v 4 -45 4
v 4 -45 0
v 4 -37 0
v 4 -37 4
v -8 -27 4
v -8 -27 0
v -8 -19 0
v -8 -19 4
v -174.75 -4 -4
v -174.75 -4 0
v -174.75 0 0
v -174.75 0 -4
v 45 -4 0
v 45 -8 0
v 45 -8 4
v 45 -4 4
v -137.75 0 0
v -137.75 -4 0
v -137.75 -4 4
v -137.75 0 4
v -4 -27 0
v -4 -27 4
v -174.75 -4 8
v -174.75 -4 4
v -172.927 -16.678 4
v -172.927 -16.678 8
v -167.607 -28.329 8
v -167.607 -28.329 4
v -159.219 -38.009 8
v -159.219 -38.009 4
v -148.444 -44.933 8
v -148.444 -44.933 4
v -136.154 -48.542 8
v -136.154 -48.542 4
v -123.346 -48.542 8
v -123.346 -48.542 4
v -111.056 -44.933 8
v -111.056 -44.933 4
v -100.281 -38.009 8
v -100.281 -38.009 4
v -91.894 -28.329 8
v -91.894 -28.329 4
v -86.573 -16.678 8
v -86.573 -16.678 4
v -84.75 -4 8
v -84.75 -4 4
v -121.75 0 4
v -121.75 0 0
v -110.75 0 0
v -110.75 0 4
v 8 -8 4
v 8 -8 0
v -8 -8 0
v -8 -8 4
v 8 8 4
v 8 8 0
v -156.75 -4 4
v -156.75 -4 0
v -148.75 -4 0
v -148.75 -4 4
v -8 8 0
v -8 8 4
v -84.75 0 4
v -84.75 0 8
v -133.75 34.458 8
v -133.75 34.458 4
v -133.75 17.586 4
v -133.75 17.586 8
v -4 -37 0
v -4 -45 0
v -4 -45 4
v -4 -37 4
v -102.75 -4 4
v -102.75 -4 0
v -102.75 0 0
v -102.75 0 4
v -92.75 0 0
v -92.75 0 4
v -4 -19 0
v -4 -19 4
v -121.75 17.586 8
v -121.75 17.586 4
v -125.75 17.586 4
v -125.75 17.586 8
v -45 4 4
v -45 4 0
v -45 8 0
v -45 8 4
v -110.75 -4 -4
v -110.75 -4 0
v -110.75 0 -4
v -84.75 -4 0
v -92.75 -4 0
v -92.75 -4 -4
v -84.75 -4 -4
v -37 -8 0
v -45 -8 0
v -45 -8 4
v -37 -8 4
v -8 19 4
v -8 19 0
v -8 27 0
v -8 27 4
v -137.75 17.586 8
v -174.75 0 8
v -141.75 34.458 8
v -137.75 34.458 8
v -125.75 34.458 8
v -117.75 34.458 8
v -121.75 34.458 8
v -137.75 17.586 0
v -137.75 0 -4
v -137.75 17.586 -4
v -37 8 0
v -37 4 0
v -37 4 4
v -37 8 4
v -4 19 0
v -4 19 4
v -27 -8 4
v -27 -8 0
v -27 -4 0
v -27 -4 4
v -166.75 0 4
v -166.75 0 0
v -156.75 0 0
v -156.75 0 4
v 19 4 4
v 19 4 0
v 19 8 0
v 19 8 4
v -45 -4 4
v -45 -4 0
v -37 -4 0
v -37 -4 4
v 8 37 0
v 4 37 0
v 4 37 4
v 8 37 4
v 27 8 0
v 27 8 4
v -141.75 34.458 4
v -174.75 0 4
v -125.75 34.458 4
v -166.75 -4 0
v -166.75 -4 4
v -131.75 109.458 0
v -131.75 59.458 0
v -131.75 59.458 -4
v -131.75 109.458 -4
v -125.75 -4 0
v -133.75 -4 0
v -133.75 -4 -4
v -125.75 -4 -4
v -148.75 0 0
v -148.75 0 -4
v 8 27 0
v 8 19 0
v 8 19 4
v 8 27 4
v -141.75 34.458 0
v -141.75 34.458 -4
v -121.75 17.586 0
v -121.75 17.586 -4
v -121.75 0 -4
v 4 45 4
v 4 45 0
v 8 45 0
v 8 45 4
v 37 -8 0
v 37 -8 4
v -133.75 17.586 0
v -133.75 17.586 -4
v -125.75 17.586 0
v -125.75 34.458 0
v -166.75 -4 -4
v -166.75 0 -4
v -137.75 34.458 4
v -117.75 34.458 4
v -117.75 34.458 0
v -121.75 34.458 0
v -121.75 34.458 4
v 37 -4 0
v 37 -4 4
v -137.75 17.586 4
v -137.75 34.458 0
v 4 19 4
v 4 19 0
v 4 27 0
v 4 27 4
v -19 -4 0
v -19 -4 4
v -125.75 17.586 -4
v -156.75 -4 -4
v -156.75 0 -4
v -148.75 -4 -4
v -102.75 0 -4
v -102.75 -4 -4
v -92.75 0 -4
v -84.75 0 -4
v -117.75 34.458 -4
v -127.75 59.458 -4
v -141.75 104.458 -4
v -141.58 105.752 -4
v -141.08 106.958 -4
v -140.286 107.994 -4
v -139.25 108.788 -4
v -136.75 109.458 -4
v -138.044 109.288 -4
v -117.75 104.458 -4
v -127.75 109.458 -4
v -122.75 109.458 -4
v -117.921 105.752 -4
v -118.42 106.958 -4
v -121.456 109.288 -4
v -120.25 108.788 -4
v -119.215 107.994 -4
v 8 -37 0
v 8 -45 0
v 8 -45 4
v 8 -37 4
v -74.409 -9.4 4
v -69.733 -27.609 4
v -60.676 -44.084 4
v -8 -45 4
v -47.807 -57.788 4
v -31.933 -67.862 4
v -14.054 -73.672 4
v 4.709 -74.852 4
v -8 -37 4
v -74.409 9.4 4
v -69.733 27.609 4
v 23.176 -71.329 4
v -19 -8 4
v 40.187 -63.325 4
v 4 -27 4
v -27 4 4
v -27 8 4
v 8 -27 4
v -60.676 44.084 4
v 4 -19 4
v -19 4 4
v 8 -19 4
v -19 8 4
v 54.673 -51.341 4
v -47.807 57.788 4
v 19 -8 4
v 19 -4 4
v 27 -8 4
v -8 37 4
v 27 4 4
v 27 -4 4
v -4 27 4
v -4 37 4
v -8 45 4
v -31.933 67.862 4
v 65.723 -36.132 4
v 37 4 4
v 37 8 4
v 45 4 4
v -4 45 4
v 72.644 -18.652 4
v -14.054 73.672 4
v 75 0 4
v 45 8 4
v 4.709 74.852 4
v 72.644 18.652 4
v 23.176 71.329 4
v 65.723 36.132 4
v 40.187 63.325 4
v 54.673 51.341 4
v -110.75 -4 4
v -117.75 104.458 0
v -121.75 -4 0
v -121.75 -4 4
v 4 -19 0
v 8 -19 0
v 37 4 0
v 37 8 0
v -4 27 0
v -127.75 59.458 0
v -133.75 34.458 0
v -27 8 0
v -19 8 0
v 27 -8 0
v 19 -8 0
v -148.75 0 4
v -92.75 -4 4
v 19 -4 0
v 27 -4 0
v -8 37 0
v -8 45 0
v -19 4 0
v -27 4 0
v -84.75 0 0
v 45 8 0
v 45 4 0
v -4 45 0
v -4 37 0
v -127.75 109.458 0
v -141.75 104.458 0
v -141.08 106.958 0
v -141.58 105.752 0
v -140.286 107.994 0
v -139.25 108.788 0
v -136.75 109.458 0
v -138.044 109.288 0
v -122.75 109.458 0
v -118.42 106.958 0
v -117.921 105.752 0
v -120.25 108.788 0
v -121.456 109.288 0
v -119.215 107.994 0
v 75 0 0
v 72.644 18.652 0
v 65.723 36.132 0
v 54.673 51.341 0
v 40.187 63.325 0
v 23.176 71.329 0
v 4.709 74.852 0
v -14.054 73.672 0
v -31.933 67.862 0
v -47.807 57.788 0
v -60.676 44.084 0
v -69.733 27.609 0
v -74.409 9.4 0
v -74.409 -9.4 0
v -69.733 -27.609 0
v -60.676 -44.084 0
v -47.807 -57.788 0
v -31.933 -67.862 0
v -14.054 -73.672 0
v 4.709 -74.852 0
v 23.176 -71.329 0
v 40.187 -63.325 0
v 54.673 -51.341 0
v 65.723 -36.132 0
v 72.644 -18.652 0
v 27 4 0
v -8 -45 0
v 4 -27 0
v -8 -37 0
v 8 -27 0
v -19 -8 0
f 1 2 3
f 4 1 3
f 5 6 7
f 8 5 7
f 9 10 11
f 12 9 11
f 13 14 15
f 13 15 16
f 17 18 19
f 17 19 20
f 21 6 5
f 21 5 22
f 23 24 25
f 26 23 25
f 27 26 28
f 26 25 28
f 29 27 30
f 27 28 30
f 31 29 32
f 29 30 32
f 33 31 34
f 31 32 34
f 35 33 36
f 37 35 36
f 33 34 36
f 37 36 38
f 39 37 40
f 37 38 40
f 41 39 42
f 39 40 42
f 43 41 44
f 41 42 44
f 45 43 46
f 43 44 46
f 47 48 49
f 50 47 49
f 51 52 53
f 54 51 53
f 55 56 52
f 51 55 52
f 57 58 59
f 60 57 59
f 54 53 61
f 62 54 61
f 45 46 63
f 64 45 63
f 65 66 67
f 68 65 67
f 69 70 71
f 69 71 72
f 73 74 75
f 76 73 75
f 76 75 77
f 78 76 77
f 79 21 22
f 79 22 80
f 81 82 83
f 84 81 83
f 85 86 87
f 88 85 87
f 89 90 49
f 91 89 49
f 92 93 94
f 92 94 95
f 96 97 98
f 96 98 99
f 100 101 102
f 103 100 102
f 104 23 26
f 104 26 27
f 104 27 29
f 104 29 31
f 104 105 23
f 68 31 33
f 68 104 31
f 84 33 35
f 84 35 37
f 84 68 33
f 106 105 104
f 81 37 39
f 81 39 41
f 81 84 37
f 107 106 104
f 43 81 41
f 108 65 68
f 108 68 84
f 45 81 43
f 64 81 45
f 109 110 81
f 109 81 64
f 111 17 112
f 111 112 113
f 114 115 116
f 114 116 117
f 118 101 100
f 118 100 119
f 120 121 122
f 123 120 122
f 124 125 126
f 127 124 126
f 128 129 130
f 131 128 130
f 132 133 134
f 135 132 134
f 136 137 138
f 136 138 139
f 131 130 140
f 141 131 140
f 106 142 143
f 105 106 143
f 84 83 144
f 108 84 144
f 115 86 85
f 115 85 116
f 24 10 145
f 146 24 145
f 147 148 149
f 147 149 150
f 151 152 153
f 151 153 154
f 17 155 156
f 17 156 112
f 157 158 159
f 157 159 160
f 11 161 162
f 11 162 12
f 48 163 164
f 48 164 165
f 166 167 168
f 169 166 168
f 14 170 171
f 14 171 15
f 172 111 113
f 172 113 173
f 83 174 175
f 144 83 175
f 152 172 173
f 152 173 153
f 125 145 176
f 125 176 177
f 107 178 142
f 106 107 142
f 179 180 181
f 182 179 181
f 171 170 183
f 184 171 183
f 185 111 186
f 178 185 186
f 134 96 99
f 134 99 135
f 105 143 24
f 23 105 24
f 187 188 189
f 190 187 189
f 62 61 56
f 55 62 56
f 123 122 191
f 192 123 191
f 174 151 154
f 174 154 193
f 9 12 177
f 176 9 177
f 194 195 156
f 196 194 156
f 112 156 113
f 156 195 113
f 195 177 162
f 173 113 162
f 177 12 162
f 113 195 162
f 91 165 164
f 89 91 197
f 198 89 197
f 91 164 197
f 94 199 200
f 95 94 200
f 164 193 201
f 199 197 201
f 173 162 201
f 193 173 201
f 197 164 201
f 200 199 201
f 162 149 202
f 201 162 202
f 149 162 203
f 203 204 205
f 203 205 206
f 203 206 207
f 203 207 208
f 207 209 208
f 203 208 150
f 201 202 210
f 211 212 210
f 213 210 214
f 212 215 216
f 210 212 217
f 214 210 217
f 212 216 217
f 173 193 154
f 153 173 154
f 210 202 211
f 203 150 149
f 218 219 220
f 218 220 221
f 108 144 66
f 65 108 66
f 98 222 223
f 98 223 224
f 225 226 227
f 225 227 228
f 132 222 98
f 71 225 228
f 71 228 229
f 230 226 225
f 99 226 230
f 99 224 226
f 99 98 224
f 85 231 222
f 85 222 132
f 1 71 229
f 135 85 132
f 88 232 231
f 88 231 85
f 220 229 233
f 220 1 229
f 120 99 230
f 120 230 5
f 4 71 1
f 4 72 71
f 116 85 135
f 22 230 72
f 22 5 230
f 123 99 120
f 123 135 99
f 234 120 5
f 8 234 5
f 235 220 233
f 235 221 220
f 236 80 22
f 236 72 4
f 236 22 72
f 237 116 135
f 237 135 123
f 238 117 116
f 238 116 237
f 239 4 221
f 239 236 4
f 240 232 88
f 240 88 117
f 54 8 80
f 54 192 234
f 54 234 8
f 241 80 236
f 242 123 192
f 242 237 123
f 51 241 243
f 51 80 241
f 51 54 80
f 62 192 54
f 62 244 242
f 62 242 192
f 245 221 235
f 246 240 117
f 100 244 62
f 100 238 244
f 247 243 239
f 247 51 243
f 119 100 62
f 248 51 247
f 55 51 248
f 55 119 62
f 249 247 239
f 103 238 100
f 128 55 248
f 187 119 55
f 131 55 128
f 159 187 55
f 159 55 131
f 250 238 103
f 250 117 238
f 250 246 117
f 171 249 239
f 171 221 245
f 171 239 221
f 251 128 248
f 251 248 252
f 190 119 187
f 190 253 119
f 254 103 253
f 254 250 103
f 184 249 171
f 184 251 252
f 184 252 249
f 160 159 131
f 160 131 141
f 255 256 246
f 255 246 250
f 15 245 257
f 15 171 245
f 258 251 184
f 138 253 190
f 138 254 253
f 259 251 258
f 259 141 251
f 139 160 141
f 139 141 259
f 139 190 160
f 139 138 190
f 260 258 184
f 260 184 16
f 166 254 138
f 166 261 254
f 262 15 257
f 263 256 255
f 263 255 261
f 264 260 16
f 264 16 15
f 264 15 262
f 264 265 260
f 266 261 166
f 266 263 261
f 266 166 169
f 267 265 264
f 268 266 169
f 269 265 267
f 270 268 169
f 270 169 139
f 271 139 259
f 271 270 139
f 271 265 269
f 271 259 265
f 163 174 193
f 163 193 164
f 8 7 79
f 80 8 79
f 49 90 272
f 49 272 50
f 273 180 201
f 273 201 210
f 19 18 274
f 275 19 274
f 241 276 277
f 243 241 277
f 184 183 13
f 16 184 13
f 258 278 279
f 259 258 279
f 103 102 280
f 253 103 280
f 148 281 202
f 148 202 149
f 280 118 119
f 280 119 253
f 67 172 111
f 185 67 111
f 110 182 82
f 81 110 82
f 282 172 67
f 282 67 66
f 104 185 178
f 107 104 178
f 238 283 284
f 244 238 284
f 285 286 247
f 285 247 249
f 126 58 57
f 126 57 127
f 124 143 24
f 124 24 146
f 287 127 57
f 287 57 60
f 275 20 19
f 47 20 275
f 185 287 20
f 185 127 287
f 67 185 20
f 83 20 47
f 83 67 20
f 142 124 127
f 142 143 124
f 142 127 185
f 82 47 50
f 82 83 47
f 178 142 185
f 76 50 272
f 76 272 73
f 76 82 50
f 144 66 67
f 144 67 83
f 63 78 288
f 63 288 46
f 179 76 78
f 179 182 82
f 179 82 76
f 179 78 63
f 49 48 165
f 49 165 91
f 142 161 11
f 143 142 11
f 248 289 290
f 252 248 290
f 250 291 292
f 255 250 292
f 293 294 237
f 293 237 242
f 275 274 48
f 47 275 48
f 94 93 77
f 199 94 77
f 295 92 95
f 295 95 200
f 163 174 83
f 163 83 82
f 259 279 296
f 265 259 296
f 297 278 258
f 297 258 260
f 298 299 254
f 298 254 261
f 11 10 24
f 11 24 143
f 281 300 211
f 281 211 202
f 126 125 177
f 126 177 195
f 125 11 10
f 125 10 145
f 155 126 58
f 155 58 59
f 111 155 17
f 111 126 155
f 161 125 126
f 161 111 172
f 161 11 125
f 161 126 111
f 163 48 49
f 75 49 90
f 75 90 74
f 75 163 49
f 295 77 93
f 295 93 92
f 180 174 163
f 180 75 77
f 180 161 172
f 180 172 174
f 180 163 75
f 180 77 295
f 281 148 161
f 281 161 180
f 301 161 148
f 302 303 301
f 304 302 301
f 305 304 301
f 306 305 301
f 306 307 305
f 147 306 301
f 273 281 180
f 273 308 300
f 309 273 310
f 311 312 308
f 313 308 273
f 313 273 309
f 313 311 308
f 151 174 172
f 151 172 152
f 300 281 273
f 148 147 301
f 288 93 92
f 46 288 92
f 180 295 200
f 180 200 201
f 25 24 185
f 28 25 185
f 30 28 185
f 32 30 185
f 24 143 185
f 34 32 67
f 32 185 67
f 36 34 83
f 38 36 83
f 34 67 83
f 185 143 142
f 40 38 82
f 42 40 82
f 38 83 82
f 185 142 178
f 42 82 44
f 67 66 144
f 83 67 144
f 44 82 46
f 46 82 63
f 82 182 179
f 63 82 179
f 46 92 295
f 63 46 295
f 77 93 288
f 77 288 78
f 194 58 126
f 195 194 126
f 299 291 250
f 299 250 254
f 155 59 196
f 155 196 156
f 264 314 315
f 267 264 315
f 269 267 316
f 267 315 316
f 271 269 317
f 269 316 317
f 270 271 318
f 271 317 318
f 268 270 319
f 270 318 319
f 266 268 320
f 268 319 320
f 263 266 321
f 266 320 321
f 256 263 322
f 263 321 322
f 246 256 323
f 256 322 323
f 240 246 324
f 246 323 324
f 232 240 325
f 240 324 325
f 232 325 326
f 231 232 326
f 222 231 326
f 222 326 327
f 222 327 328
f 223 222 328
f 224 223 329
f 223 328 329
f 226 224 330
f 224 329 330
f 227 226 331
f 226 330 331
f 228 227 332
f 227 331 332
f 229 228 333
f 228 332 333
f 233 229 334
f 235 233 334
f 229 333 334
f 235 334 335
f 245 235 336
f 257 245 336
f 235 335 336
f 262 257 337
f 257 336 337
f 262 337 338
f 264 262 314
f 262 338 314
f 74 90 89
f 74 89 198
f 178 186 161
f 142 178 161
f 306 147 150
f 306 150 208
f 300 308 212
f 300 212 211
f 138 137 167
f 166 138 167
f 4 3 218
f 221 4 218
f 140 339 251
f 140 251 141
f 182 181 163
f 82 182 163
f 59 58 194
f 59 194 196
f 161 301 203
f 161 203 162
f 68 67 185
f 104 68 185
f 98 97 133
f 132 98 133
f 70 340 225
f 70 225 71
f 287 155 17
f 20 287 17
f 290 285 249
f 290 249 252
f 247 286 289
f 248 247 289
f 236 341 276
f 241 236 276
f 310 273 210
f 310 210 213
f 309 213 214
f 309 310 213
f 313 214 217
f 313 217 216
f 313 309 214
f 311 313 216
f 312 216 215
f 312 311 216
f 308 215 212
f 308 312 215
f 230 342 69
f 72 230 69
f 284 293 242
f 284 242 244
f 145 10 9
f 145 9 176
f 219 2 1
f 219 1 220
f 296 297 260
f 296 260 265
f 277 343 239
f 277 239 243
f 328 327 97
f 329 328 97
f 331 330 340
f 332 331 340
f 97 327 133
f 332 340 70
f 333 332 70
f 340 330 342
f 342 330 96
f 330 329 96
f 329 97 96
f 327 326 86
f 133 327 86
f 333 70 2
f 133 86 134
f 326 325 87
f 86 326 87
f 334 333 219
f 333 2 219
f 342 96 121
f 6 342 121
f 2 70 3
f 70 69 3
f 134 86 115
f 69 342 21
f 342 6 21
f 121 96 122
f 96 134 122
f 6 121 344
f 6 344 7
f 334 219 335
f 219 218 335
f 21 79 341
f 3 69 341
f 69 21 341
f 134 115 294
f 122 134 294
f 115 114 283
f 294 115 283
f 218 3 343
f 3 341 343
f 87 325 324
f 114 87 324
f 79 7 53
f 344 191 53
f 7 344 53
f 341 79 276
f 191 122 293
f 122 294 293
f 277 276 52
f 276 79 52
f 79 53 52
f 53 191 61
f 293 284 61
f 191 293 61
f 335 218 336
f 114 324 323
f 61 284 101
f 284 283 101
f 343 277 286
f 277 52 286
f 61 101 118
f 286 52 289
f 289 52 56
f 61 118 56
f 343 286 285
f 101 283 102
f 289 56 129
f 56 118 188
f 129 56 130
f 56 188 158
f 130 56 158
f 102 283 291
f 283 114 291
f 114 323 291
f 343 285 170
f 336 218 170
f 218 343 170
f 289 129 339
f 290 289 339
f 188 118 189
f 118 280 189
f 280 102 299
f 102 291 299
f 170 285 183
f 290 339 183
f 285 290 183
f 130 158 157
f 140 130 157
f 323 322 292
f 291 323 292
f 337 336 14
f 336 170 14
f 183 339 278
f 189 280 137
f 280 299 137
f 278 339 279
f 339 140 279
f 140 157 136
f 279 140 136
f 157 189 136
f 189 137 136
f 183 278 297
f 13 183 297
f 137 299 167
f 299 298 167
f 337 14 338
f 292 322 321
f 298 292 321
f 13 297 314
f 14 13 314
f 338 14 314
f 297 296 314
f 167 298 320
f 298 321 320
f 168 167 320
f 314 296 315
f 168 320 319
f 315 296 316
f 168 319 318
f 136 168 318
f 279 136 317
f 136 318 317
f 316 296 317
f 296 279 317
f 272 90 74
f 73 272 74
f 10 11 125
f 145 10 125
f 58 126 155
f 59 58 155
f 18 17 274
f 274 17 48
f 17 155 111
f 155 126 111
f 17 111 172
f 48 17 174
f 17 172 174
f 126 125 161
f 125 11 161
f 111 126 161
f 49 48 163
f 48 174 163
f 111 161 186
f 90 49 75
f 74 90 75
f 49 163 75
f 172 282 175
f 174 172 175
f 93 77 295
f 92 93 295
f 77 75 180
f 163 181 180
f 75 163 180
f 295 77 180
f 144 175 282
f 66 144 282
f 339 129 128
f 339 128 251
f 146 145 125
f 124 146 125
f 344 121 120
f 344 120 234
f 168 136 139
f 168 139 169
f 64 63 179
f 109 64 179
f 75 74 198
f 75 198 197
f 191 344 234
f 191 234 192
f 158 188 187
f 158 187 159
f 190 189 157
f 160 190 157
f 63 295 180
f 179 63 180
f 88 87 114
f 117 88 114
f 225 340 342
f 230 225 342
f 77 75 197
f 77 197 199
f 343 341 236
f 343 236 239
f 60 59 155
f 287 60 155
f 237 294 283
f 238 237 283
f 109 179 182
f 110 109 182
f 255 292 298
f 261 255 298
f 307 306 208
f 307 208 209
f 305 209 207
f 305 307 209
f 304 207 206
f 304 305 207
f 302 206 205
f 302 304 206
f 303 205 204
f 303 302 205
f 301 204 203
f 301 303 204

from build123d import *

# Parameters (mm, degrees)
F0_W     = 8
F0_H     = 4
F0_W_2   = 4
F0_H_2   = 17.5864007324
F0_H_3   = 16.8719124049
F1_DEPTH = 4
F0_R     = 75
F0_H_4   = 8
F2_DEPTH = 4
F4_DEPTH = 4


with BuildPart() as f1:
    # F0 (on Top) → F1 (new body)
    with BuildSketch(Plane.XY):
        with Locations((-170.7501623631, -2)):
            Rectangle(F0_W, F0_H)
        Polygon((-137.7501623631, 17.5864007324), (-137.7501623631, 34.4583131373), (-141.7501623631, 34.4583131373), (-174.7501623631, 0), (-166.7501623631, 0), (-156.7501623631, 0), (-148.7501623631, 0), (-137.7501623631, 0), align=None)
        with Locations((-152.7501623631, -2)):
            Rectangle(F0_W, F0_H)
        with Locations((-135.7501623631, 8.7932003662)):
            Rectangle(F0_W_2, F0_H_2)
        with Locations((-131.7501623631, 8.7932003662)):
            Rectangle(F0_W_2, F0_H_2)
        with Locations((-131.7501623631, 26.0223569348)):
            Rectangle(F0_W_2, F0_H_3)
        with Locations((-127.7501623631, 26.0223569348)):
            Rectangle(F0_W_2, F0_H_3)
        with Locations((-127.7501623631, 8.7932003662)):
            Rectangle(F0_W_2, F0_H_2)
        with Locations((-123.7501623631, 8.7932003662)):
            Rectangle(F0_W_2, F0_H_2)
        Polygon((-92.7501623631, 0), (-84.7501623631, 0), (-117.7501623631, 34.4583131373), (-121.7501623631, 34.4583131373), (-121.7501623631, 17.5864007324), (-121.7501623631, 0), (-110.7501623631, 0), (-102.7501623631, 0), align=None)
        with Locations((-106.7501623631, -2)):
            Rectangle(F0_W, F0_H)
        with Locations((-88.7501623631, -2)):
            Rectangle(F0_W, F0_H)
        with Locations((-135.7501623631, -2)):
            Rectangle(F0_W_2, F0_H)
        with Locations((-131.7501623631, -2)):
            Rectangle(F0_W_2, F0_H)
        with Locations((-127.7501623631, -2)):
            Rectangle(F0_W_2, F0_H)
        with Locations((-123.7501623631, -2)):
            Rectangle(F0_W_2, F0_H)
    extrude(amount=F1_DEPTH)


with BuildPart() as f1b:
    # F0 (on Top) → F1, piece 2 (new body)
    with BuildSketch(Plane.XY):
        Circle(F0_R)
        with Locations((-6, -41)):
            Rectangle(F0_W_2, F0_H_4, mode=Mode.SUBTRACT)
        with Locations((6, -41)):
            Rectangle(F0_W_2, F0_H_4, mode=Mode.SUBTRACT)
        with Locations((-41, -6)):
            Rectangle(F0_W, F0_H, mode=Mode.SUBTRACT)
        with Locations((-23, -6)):
            Rectangle(F0_W, F0_H, mode=Mode.SUBTRACT)
        with Locations((-6, -23)):
            Rectangle(F0_W_2, F0_H_4, mode=Mode.SUBTRACT)
        with Locations((6, -23)):
            Rectangle(F0_W_2, F0_H_4, mode=Mode.SUBTRACT)
        with Locations((-41, 6)):
            Rectangle(F0_W, F0_H, mode=Mode.SUBTRACT)
        with Locations((-23, 6)):
            Rectangle(F0_W, F0_H, mode=Mode.SUBTRACT)
        Polygon((-8, -4), (-8, 4), (-8, 8), (8, 8), (8, 4), (8, -4), (8, -8), (-8, -8), align=None, mode=Mode.SUBTRACT)
        with Locations((23, -6)):
            Rectangle(F0_W, F0_H, mode=Mode.SUBTRACT)
        with Locations((41, -6)):
            Rectangle(F0_W, F0_H, mode=Mode.SUBTRACT)
        with Locations((23, 6)):
            Rectangle(F0_W, F0_H, mode=Mode.SUBTRACT)
        with Locations((41, 6)):
            Rectangle(F0_W, F0_H, mode=Mode.SUBTRACT)
        with Locations((-6, 23)):
            Rectangle(F0_W_2, F0_H_4, mode=Mode.SUBTRACT)
        with Locations((6, 23)):
            Rectangle(F0_W_2, F0_H_4, mode=Mode.SUBTRACT)
        with Locations((-6, 41)):
            Rectangle(F0_W_2, F0_H_4, mode=Mode.SUBTRACT)
        with Locations((6, 41)):
            Rectangle(F0_W_2, F0_H_4, mode=Mode.SUBTRACT)
    extrude(amount=F1_DEPTH)


with BuildPart() as f2:
    # F0 (on Top) → F2 (new body)
    with BuildSketch(Plane.XY):
        with Locations((-170.7501623631, -2)):
            Rectangle(F0_W, F0_H)
        Polygon((-137.7501623631, 17.5864007324), (-137.7501623631, 34.4583131373), (-141.7501623631, 34.4583131373), (-174.7501623631, 0), (-166.7501623631, 0), (-156.7501623631, 0), (-148.7501623631, 0), (-137.7501623631, 0), align=None)
        with Locations((-152.7501623631, -2)):
            Rectangle(F0_W, F0_H)
        with Locations((-131.7501623631, 26.0223569348)):
            Rectangle(F0_W_2, F0_H_3)
        with Locations((-127.7501623631, 26.0223569348)):
            Rectangle(F0_W_2, F0_H_3)
        with Locations((-127.7501623631, 8.7932003662)):
            Rectangle(F0_W_2, F0_H_2)
        with Locations((-131.7501623631, 8.7932003662)):
            Rectangle(F0_W_2, F0_H_2)
        with Locations((-131.7501623631, -2)):
            Rectangle(F0_W_2, F0_H)
        with Locations((-127.7501623631, -2)):
            Rectangle(F0_W_2, F0_H)
        with Locations((-135.7501623631, 26.0223569348)):
            Rectangle(F0_W_2, F0_H_3)
        with Locations((-123.7501623631, 26.0223569348)):
            Rectangle(F0_W_2, F0_H_3)
        Polygon((-92.7501623631, 0), (-84.7501623631, 0), (-117.7501623631, 34.4583131373), (-121.7501623631, 34.4583131373), (-121.7501623631, 17.5864007324), (-121.7501623631, 0), (-110.7501623631, 0), (-102.7501623631, 0), align=None)
        with Locations((-106.7501623631, -2)):
            Rectangle(F0_W, F0_H)
        with Locations((-88.7501623631, -2)):
            Rectangle(F0_W, F0_H)
        with BuildLine():
            Line((-121.7501623631, 34.4583131373), (-117.7501623631, 34.4583131373))
            Line((-117.7501623631, 34.4583131373), (-117.7501623631, 104.4583131373))
            ThreePointArc((-117.7501623631, 104.4583131373), (-119.2146284571, 107.9938470432), (-122.7501623631, 109.4583131373))
            Line((-122.7501623631, 109.4583131373), (-127.7501623631, 109.4583131373))
            Line((-127.7501623631, 109.4583131373), (-127.7501623631, 59.4583131373))
            Line((-127.7501623631, 59.4583131373), (-129.7501623631, 59.4583131373))
            Line((-129.7501623631, 59.4583131373), (-131.7501623631, 59.4583131373))
            Line((-131.7501623631, 59.4583131373), (-131.7501623631, 109.4583131373))
            Line((-131.7501623631, 109.4583131373), (-136.7501623631, 109.4583131373))
            ThreePointArc((-136.7501623631, 109.4583131373), (-140.285696269, 107.9938470432), (-141.7501623631, 104.4583131373))
            Line((-141.7501623631, 104.4583131373), (-141.7501623631, 34.4583131373))
            Line((-141.7501623631, 34.4583131373), (-137.7501623631, 34.4583131373))
            Line((-137.7501623631, 34.4583131373), (-133.7501623631, 34.4583131373))
            Line((-133.7501623631, 34.4583131373), (-129.7501623631, 34.4583131373))
            Line((-129.7501623631, 34.4583131373), (-125.7501623631, 34.4583131373))
            Line((-125.7501623631, 34.4583131373), (-121.7501623631, 34.4583131373))
        make_face()
    extrude(amount=-F2_DEPTH)


with BuildPart() as f4:
    # F3 (on face) → F4 (new body)
    with BuildSketch(Plane.XY.offset(4)):
        with BuildLine():
            Line((-166.7501623631, -4), (-174.7501623631, -4))
            ThreePointArc((-174.7501623631, -4), (-129.7501623631, -49), (-84.7501623631, -4))
            Line((-84.7501623631, -4), (-92.7501623631, -4))
            Line((-92.7501623631, -4), (-92.7501623631, 0))
            Line((-92.7501623631, 0), (-102.7501623631, 0))
            Line((-102.7501623631, 0), (-102.7501623631, -4))
            Line((-102.7501623631, -4), (-110.7501623631, -4))
            Line((-110.7501623631, -4), (-110.7501623631, 0))
            Line((-110.7501623631, 0), (-121.7501623631, 0))
            Line((-121.7501623631, 0), (-121.7501623631, -4))
            Line((-121.7501623631, -4), (-137.7501623631, -4))
            Line((-137.7501623631, -4), (-137.7501623631, 0))
            Line((-137.7501623631, 0), (-148.7501623631, 0))
            Line((-148.7501623631, 0), (-148.7501623631, -4))
            Line((-148.7501623631, -4), (-156.7501623631, -4))
            Line((-156.7501623631, -4), (-156.7501623631, 0))
            Line((-156.7501623631, 0), (-166.7501623631, 0))
            Line((-166.7501623631, 0), (-166.7501623631, -4))
        make_face()
        Polygon((-174.7501623631, 0), (-174.7501623631, -4), (-166.7501623631, -4), (-166.7501623631, 0), (-156.7501623631, 0), (-156.7501623631, -4), (-148.7501623631, -4), (-148.7501623631, 0), (-137.7501623631, 0), (-137.7501623631, -4), (-121.7501623631, -4), (-121.7501623631, 0), (-110.7501623631, 0), (-110.7501623631, -4), (-102.7501623631, -4), (-102.7501623631, 0), (-92.7501623631, 0), (-92.7501623631, -4), (-84.7501623631, -4), (-84.7501623631, 0), (-117.7501623631, 34.4583131373), (-121.7501623631, 34.4583131373), (-121.7501623631, 17.5864007324), (-125.7501623631, 17.5864007324), (-125.7501623631, 34.4583131373), (-133.7501623631, 34.4583131373), (-133.7501623631, 17.5864007324), (-137.7501623631, 17.5864007324), (-137.7501623631, 34.4583131373), (-141.7501623631, 34.4583131373), align=None)
    extrude(amount=F4_DEPTH)


solid = Compound([f1.part, f1b.part, f2.part, f4.part])
